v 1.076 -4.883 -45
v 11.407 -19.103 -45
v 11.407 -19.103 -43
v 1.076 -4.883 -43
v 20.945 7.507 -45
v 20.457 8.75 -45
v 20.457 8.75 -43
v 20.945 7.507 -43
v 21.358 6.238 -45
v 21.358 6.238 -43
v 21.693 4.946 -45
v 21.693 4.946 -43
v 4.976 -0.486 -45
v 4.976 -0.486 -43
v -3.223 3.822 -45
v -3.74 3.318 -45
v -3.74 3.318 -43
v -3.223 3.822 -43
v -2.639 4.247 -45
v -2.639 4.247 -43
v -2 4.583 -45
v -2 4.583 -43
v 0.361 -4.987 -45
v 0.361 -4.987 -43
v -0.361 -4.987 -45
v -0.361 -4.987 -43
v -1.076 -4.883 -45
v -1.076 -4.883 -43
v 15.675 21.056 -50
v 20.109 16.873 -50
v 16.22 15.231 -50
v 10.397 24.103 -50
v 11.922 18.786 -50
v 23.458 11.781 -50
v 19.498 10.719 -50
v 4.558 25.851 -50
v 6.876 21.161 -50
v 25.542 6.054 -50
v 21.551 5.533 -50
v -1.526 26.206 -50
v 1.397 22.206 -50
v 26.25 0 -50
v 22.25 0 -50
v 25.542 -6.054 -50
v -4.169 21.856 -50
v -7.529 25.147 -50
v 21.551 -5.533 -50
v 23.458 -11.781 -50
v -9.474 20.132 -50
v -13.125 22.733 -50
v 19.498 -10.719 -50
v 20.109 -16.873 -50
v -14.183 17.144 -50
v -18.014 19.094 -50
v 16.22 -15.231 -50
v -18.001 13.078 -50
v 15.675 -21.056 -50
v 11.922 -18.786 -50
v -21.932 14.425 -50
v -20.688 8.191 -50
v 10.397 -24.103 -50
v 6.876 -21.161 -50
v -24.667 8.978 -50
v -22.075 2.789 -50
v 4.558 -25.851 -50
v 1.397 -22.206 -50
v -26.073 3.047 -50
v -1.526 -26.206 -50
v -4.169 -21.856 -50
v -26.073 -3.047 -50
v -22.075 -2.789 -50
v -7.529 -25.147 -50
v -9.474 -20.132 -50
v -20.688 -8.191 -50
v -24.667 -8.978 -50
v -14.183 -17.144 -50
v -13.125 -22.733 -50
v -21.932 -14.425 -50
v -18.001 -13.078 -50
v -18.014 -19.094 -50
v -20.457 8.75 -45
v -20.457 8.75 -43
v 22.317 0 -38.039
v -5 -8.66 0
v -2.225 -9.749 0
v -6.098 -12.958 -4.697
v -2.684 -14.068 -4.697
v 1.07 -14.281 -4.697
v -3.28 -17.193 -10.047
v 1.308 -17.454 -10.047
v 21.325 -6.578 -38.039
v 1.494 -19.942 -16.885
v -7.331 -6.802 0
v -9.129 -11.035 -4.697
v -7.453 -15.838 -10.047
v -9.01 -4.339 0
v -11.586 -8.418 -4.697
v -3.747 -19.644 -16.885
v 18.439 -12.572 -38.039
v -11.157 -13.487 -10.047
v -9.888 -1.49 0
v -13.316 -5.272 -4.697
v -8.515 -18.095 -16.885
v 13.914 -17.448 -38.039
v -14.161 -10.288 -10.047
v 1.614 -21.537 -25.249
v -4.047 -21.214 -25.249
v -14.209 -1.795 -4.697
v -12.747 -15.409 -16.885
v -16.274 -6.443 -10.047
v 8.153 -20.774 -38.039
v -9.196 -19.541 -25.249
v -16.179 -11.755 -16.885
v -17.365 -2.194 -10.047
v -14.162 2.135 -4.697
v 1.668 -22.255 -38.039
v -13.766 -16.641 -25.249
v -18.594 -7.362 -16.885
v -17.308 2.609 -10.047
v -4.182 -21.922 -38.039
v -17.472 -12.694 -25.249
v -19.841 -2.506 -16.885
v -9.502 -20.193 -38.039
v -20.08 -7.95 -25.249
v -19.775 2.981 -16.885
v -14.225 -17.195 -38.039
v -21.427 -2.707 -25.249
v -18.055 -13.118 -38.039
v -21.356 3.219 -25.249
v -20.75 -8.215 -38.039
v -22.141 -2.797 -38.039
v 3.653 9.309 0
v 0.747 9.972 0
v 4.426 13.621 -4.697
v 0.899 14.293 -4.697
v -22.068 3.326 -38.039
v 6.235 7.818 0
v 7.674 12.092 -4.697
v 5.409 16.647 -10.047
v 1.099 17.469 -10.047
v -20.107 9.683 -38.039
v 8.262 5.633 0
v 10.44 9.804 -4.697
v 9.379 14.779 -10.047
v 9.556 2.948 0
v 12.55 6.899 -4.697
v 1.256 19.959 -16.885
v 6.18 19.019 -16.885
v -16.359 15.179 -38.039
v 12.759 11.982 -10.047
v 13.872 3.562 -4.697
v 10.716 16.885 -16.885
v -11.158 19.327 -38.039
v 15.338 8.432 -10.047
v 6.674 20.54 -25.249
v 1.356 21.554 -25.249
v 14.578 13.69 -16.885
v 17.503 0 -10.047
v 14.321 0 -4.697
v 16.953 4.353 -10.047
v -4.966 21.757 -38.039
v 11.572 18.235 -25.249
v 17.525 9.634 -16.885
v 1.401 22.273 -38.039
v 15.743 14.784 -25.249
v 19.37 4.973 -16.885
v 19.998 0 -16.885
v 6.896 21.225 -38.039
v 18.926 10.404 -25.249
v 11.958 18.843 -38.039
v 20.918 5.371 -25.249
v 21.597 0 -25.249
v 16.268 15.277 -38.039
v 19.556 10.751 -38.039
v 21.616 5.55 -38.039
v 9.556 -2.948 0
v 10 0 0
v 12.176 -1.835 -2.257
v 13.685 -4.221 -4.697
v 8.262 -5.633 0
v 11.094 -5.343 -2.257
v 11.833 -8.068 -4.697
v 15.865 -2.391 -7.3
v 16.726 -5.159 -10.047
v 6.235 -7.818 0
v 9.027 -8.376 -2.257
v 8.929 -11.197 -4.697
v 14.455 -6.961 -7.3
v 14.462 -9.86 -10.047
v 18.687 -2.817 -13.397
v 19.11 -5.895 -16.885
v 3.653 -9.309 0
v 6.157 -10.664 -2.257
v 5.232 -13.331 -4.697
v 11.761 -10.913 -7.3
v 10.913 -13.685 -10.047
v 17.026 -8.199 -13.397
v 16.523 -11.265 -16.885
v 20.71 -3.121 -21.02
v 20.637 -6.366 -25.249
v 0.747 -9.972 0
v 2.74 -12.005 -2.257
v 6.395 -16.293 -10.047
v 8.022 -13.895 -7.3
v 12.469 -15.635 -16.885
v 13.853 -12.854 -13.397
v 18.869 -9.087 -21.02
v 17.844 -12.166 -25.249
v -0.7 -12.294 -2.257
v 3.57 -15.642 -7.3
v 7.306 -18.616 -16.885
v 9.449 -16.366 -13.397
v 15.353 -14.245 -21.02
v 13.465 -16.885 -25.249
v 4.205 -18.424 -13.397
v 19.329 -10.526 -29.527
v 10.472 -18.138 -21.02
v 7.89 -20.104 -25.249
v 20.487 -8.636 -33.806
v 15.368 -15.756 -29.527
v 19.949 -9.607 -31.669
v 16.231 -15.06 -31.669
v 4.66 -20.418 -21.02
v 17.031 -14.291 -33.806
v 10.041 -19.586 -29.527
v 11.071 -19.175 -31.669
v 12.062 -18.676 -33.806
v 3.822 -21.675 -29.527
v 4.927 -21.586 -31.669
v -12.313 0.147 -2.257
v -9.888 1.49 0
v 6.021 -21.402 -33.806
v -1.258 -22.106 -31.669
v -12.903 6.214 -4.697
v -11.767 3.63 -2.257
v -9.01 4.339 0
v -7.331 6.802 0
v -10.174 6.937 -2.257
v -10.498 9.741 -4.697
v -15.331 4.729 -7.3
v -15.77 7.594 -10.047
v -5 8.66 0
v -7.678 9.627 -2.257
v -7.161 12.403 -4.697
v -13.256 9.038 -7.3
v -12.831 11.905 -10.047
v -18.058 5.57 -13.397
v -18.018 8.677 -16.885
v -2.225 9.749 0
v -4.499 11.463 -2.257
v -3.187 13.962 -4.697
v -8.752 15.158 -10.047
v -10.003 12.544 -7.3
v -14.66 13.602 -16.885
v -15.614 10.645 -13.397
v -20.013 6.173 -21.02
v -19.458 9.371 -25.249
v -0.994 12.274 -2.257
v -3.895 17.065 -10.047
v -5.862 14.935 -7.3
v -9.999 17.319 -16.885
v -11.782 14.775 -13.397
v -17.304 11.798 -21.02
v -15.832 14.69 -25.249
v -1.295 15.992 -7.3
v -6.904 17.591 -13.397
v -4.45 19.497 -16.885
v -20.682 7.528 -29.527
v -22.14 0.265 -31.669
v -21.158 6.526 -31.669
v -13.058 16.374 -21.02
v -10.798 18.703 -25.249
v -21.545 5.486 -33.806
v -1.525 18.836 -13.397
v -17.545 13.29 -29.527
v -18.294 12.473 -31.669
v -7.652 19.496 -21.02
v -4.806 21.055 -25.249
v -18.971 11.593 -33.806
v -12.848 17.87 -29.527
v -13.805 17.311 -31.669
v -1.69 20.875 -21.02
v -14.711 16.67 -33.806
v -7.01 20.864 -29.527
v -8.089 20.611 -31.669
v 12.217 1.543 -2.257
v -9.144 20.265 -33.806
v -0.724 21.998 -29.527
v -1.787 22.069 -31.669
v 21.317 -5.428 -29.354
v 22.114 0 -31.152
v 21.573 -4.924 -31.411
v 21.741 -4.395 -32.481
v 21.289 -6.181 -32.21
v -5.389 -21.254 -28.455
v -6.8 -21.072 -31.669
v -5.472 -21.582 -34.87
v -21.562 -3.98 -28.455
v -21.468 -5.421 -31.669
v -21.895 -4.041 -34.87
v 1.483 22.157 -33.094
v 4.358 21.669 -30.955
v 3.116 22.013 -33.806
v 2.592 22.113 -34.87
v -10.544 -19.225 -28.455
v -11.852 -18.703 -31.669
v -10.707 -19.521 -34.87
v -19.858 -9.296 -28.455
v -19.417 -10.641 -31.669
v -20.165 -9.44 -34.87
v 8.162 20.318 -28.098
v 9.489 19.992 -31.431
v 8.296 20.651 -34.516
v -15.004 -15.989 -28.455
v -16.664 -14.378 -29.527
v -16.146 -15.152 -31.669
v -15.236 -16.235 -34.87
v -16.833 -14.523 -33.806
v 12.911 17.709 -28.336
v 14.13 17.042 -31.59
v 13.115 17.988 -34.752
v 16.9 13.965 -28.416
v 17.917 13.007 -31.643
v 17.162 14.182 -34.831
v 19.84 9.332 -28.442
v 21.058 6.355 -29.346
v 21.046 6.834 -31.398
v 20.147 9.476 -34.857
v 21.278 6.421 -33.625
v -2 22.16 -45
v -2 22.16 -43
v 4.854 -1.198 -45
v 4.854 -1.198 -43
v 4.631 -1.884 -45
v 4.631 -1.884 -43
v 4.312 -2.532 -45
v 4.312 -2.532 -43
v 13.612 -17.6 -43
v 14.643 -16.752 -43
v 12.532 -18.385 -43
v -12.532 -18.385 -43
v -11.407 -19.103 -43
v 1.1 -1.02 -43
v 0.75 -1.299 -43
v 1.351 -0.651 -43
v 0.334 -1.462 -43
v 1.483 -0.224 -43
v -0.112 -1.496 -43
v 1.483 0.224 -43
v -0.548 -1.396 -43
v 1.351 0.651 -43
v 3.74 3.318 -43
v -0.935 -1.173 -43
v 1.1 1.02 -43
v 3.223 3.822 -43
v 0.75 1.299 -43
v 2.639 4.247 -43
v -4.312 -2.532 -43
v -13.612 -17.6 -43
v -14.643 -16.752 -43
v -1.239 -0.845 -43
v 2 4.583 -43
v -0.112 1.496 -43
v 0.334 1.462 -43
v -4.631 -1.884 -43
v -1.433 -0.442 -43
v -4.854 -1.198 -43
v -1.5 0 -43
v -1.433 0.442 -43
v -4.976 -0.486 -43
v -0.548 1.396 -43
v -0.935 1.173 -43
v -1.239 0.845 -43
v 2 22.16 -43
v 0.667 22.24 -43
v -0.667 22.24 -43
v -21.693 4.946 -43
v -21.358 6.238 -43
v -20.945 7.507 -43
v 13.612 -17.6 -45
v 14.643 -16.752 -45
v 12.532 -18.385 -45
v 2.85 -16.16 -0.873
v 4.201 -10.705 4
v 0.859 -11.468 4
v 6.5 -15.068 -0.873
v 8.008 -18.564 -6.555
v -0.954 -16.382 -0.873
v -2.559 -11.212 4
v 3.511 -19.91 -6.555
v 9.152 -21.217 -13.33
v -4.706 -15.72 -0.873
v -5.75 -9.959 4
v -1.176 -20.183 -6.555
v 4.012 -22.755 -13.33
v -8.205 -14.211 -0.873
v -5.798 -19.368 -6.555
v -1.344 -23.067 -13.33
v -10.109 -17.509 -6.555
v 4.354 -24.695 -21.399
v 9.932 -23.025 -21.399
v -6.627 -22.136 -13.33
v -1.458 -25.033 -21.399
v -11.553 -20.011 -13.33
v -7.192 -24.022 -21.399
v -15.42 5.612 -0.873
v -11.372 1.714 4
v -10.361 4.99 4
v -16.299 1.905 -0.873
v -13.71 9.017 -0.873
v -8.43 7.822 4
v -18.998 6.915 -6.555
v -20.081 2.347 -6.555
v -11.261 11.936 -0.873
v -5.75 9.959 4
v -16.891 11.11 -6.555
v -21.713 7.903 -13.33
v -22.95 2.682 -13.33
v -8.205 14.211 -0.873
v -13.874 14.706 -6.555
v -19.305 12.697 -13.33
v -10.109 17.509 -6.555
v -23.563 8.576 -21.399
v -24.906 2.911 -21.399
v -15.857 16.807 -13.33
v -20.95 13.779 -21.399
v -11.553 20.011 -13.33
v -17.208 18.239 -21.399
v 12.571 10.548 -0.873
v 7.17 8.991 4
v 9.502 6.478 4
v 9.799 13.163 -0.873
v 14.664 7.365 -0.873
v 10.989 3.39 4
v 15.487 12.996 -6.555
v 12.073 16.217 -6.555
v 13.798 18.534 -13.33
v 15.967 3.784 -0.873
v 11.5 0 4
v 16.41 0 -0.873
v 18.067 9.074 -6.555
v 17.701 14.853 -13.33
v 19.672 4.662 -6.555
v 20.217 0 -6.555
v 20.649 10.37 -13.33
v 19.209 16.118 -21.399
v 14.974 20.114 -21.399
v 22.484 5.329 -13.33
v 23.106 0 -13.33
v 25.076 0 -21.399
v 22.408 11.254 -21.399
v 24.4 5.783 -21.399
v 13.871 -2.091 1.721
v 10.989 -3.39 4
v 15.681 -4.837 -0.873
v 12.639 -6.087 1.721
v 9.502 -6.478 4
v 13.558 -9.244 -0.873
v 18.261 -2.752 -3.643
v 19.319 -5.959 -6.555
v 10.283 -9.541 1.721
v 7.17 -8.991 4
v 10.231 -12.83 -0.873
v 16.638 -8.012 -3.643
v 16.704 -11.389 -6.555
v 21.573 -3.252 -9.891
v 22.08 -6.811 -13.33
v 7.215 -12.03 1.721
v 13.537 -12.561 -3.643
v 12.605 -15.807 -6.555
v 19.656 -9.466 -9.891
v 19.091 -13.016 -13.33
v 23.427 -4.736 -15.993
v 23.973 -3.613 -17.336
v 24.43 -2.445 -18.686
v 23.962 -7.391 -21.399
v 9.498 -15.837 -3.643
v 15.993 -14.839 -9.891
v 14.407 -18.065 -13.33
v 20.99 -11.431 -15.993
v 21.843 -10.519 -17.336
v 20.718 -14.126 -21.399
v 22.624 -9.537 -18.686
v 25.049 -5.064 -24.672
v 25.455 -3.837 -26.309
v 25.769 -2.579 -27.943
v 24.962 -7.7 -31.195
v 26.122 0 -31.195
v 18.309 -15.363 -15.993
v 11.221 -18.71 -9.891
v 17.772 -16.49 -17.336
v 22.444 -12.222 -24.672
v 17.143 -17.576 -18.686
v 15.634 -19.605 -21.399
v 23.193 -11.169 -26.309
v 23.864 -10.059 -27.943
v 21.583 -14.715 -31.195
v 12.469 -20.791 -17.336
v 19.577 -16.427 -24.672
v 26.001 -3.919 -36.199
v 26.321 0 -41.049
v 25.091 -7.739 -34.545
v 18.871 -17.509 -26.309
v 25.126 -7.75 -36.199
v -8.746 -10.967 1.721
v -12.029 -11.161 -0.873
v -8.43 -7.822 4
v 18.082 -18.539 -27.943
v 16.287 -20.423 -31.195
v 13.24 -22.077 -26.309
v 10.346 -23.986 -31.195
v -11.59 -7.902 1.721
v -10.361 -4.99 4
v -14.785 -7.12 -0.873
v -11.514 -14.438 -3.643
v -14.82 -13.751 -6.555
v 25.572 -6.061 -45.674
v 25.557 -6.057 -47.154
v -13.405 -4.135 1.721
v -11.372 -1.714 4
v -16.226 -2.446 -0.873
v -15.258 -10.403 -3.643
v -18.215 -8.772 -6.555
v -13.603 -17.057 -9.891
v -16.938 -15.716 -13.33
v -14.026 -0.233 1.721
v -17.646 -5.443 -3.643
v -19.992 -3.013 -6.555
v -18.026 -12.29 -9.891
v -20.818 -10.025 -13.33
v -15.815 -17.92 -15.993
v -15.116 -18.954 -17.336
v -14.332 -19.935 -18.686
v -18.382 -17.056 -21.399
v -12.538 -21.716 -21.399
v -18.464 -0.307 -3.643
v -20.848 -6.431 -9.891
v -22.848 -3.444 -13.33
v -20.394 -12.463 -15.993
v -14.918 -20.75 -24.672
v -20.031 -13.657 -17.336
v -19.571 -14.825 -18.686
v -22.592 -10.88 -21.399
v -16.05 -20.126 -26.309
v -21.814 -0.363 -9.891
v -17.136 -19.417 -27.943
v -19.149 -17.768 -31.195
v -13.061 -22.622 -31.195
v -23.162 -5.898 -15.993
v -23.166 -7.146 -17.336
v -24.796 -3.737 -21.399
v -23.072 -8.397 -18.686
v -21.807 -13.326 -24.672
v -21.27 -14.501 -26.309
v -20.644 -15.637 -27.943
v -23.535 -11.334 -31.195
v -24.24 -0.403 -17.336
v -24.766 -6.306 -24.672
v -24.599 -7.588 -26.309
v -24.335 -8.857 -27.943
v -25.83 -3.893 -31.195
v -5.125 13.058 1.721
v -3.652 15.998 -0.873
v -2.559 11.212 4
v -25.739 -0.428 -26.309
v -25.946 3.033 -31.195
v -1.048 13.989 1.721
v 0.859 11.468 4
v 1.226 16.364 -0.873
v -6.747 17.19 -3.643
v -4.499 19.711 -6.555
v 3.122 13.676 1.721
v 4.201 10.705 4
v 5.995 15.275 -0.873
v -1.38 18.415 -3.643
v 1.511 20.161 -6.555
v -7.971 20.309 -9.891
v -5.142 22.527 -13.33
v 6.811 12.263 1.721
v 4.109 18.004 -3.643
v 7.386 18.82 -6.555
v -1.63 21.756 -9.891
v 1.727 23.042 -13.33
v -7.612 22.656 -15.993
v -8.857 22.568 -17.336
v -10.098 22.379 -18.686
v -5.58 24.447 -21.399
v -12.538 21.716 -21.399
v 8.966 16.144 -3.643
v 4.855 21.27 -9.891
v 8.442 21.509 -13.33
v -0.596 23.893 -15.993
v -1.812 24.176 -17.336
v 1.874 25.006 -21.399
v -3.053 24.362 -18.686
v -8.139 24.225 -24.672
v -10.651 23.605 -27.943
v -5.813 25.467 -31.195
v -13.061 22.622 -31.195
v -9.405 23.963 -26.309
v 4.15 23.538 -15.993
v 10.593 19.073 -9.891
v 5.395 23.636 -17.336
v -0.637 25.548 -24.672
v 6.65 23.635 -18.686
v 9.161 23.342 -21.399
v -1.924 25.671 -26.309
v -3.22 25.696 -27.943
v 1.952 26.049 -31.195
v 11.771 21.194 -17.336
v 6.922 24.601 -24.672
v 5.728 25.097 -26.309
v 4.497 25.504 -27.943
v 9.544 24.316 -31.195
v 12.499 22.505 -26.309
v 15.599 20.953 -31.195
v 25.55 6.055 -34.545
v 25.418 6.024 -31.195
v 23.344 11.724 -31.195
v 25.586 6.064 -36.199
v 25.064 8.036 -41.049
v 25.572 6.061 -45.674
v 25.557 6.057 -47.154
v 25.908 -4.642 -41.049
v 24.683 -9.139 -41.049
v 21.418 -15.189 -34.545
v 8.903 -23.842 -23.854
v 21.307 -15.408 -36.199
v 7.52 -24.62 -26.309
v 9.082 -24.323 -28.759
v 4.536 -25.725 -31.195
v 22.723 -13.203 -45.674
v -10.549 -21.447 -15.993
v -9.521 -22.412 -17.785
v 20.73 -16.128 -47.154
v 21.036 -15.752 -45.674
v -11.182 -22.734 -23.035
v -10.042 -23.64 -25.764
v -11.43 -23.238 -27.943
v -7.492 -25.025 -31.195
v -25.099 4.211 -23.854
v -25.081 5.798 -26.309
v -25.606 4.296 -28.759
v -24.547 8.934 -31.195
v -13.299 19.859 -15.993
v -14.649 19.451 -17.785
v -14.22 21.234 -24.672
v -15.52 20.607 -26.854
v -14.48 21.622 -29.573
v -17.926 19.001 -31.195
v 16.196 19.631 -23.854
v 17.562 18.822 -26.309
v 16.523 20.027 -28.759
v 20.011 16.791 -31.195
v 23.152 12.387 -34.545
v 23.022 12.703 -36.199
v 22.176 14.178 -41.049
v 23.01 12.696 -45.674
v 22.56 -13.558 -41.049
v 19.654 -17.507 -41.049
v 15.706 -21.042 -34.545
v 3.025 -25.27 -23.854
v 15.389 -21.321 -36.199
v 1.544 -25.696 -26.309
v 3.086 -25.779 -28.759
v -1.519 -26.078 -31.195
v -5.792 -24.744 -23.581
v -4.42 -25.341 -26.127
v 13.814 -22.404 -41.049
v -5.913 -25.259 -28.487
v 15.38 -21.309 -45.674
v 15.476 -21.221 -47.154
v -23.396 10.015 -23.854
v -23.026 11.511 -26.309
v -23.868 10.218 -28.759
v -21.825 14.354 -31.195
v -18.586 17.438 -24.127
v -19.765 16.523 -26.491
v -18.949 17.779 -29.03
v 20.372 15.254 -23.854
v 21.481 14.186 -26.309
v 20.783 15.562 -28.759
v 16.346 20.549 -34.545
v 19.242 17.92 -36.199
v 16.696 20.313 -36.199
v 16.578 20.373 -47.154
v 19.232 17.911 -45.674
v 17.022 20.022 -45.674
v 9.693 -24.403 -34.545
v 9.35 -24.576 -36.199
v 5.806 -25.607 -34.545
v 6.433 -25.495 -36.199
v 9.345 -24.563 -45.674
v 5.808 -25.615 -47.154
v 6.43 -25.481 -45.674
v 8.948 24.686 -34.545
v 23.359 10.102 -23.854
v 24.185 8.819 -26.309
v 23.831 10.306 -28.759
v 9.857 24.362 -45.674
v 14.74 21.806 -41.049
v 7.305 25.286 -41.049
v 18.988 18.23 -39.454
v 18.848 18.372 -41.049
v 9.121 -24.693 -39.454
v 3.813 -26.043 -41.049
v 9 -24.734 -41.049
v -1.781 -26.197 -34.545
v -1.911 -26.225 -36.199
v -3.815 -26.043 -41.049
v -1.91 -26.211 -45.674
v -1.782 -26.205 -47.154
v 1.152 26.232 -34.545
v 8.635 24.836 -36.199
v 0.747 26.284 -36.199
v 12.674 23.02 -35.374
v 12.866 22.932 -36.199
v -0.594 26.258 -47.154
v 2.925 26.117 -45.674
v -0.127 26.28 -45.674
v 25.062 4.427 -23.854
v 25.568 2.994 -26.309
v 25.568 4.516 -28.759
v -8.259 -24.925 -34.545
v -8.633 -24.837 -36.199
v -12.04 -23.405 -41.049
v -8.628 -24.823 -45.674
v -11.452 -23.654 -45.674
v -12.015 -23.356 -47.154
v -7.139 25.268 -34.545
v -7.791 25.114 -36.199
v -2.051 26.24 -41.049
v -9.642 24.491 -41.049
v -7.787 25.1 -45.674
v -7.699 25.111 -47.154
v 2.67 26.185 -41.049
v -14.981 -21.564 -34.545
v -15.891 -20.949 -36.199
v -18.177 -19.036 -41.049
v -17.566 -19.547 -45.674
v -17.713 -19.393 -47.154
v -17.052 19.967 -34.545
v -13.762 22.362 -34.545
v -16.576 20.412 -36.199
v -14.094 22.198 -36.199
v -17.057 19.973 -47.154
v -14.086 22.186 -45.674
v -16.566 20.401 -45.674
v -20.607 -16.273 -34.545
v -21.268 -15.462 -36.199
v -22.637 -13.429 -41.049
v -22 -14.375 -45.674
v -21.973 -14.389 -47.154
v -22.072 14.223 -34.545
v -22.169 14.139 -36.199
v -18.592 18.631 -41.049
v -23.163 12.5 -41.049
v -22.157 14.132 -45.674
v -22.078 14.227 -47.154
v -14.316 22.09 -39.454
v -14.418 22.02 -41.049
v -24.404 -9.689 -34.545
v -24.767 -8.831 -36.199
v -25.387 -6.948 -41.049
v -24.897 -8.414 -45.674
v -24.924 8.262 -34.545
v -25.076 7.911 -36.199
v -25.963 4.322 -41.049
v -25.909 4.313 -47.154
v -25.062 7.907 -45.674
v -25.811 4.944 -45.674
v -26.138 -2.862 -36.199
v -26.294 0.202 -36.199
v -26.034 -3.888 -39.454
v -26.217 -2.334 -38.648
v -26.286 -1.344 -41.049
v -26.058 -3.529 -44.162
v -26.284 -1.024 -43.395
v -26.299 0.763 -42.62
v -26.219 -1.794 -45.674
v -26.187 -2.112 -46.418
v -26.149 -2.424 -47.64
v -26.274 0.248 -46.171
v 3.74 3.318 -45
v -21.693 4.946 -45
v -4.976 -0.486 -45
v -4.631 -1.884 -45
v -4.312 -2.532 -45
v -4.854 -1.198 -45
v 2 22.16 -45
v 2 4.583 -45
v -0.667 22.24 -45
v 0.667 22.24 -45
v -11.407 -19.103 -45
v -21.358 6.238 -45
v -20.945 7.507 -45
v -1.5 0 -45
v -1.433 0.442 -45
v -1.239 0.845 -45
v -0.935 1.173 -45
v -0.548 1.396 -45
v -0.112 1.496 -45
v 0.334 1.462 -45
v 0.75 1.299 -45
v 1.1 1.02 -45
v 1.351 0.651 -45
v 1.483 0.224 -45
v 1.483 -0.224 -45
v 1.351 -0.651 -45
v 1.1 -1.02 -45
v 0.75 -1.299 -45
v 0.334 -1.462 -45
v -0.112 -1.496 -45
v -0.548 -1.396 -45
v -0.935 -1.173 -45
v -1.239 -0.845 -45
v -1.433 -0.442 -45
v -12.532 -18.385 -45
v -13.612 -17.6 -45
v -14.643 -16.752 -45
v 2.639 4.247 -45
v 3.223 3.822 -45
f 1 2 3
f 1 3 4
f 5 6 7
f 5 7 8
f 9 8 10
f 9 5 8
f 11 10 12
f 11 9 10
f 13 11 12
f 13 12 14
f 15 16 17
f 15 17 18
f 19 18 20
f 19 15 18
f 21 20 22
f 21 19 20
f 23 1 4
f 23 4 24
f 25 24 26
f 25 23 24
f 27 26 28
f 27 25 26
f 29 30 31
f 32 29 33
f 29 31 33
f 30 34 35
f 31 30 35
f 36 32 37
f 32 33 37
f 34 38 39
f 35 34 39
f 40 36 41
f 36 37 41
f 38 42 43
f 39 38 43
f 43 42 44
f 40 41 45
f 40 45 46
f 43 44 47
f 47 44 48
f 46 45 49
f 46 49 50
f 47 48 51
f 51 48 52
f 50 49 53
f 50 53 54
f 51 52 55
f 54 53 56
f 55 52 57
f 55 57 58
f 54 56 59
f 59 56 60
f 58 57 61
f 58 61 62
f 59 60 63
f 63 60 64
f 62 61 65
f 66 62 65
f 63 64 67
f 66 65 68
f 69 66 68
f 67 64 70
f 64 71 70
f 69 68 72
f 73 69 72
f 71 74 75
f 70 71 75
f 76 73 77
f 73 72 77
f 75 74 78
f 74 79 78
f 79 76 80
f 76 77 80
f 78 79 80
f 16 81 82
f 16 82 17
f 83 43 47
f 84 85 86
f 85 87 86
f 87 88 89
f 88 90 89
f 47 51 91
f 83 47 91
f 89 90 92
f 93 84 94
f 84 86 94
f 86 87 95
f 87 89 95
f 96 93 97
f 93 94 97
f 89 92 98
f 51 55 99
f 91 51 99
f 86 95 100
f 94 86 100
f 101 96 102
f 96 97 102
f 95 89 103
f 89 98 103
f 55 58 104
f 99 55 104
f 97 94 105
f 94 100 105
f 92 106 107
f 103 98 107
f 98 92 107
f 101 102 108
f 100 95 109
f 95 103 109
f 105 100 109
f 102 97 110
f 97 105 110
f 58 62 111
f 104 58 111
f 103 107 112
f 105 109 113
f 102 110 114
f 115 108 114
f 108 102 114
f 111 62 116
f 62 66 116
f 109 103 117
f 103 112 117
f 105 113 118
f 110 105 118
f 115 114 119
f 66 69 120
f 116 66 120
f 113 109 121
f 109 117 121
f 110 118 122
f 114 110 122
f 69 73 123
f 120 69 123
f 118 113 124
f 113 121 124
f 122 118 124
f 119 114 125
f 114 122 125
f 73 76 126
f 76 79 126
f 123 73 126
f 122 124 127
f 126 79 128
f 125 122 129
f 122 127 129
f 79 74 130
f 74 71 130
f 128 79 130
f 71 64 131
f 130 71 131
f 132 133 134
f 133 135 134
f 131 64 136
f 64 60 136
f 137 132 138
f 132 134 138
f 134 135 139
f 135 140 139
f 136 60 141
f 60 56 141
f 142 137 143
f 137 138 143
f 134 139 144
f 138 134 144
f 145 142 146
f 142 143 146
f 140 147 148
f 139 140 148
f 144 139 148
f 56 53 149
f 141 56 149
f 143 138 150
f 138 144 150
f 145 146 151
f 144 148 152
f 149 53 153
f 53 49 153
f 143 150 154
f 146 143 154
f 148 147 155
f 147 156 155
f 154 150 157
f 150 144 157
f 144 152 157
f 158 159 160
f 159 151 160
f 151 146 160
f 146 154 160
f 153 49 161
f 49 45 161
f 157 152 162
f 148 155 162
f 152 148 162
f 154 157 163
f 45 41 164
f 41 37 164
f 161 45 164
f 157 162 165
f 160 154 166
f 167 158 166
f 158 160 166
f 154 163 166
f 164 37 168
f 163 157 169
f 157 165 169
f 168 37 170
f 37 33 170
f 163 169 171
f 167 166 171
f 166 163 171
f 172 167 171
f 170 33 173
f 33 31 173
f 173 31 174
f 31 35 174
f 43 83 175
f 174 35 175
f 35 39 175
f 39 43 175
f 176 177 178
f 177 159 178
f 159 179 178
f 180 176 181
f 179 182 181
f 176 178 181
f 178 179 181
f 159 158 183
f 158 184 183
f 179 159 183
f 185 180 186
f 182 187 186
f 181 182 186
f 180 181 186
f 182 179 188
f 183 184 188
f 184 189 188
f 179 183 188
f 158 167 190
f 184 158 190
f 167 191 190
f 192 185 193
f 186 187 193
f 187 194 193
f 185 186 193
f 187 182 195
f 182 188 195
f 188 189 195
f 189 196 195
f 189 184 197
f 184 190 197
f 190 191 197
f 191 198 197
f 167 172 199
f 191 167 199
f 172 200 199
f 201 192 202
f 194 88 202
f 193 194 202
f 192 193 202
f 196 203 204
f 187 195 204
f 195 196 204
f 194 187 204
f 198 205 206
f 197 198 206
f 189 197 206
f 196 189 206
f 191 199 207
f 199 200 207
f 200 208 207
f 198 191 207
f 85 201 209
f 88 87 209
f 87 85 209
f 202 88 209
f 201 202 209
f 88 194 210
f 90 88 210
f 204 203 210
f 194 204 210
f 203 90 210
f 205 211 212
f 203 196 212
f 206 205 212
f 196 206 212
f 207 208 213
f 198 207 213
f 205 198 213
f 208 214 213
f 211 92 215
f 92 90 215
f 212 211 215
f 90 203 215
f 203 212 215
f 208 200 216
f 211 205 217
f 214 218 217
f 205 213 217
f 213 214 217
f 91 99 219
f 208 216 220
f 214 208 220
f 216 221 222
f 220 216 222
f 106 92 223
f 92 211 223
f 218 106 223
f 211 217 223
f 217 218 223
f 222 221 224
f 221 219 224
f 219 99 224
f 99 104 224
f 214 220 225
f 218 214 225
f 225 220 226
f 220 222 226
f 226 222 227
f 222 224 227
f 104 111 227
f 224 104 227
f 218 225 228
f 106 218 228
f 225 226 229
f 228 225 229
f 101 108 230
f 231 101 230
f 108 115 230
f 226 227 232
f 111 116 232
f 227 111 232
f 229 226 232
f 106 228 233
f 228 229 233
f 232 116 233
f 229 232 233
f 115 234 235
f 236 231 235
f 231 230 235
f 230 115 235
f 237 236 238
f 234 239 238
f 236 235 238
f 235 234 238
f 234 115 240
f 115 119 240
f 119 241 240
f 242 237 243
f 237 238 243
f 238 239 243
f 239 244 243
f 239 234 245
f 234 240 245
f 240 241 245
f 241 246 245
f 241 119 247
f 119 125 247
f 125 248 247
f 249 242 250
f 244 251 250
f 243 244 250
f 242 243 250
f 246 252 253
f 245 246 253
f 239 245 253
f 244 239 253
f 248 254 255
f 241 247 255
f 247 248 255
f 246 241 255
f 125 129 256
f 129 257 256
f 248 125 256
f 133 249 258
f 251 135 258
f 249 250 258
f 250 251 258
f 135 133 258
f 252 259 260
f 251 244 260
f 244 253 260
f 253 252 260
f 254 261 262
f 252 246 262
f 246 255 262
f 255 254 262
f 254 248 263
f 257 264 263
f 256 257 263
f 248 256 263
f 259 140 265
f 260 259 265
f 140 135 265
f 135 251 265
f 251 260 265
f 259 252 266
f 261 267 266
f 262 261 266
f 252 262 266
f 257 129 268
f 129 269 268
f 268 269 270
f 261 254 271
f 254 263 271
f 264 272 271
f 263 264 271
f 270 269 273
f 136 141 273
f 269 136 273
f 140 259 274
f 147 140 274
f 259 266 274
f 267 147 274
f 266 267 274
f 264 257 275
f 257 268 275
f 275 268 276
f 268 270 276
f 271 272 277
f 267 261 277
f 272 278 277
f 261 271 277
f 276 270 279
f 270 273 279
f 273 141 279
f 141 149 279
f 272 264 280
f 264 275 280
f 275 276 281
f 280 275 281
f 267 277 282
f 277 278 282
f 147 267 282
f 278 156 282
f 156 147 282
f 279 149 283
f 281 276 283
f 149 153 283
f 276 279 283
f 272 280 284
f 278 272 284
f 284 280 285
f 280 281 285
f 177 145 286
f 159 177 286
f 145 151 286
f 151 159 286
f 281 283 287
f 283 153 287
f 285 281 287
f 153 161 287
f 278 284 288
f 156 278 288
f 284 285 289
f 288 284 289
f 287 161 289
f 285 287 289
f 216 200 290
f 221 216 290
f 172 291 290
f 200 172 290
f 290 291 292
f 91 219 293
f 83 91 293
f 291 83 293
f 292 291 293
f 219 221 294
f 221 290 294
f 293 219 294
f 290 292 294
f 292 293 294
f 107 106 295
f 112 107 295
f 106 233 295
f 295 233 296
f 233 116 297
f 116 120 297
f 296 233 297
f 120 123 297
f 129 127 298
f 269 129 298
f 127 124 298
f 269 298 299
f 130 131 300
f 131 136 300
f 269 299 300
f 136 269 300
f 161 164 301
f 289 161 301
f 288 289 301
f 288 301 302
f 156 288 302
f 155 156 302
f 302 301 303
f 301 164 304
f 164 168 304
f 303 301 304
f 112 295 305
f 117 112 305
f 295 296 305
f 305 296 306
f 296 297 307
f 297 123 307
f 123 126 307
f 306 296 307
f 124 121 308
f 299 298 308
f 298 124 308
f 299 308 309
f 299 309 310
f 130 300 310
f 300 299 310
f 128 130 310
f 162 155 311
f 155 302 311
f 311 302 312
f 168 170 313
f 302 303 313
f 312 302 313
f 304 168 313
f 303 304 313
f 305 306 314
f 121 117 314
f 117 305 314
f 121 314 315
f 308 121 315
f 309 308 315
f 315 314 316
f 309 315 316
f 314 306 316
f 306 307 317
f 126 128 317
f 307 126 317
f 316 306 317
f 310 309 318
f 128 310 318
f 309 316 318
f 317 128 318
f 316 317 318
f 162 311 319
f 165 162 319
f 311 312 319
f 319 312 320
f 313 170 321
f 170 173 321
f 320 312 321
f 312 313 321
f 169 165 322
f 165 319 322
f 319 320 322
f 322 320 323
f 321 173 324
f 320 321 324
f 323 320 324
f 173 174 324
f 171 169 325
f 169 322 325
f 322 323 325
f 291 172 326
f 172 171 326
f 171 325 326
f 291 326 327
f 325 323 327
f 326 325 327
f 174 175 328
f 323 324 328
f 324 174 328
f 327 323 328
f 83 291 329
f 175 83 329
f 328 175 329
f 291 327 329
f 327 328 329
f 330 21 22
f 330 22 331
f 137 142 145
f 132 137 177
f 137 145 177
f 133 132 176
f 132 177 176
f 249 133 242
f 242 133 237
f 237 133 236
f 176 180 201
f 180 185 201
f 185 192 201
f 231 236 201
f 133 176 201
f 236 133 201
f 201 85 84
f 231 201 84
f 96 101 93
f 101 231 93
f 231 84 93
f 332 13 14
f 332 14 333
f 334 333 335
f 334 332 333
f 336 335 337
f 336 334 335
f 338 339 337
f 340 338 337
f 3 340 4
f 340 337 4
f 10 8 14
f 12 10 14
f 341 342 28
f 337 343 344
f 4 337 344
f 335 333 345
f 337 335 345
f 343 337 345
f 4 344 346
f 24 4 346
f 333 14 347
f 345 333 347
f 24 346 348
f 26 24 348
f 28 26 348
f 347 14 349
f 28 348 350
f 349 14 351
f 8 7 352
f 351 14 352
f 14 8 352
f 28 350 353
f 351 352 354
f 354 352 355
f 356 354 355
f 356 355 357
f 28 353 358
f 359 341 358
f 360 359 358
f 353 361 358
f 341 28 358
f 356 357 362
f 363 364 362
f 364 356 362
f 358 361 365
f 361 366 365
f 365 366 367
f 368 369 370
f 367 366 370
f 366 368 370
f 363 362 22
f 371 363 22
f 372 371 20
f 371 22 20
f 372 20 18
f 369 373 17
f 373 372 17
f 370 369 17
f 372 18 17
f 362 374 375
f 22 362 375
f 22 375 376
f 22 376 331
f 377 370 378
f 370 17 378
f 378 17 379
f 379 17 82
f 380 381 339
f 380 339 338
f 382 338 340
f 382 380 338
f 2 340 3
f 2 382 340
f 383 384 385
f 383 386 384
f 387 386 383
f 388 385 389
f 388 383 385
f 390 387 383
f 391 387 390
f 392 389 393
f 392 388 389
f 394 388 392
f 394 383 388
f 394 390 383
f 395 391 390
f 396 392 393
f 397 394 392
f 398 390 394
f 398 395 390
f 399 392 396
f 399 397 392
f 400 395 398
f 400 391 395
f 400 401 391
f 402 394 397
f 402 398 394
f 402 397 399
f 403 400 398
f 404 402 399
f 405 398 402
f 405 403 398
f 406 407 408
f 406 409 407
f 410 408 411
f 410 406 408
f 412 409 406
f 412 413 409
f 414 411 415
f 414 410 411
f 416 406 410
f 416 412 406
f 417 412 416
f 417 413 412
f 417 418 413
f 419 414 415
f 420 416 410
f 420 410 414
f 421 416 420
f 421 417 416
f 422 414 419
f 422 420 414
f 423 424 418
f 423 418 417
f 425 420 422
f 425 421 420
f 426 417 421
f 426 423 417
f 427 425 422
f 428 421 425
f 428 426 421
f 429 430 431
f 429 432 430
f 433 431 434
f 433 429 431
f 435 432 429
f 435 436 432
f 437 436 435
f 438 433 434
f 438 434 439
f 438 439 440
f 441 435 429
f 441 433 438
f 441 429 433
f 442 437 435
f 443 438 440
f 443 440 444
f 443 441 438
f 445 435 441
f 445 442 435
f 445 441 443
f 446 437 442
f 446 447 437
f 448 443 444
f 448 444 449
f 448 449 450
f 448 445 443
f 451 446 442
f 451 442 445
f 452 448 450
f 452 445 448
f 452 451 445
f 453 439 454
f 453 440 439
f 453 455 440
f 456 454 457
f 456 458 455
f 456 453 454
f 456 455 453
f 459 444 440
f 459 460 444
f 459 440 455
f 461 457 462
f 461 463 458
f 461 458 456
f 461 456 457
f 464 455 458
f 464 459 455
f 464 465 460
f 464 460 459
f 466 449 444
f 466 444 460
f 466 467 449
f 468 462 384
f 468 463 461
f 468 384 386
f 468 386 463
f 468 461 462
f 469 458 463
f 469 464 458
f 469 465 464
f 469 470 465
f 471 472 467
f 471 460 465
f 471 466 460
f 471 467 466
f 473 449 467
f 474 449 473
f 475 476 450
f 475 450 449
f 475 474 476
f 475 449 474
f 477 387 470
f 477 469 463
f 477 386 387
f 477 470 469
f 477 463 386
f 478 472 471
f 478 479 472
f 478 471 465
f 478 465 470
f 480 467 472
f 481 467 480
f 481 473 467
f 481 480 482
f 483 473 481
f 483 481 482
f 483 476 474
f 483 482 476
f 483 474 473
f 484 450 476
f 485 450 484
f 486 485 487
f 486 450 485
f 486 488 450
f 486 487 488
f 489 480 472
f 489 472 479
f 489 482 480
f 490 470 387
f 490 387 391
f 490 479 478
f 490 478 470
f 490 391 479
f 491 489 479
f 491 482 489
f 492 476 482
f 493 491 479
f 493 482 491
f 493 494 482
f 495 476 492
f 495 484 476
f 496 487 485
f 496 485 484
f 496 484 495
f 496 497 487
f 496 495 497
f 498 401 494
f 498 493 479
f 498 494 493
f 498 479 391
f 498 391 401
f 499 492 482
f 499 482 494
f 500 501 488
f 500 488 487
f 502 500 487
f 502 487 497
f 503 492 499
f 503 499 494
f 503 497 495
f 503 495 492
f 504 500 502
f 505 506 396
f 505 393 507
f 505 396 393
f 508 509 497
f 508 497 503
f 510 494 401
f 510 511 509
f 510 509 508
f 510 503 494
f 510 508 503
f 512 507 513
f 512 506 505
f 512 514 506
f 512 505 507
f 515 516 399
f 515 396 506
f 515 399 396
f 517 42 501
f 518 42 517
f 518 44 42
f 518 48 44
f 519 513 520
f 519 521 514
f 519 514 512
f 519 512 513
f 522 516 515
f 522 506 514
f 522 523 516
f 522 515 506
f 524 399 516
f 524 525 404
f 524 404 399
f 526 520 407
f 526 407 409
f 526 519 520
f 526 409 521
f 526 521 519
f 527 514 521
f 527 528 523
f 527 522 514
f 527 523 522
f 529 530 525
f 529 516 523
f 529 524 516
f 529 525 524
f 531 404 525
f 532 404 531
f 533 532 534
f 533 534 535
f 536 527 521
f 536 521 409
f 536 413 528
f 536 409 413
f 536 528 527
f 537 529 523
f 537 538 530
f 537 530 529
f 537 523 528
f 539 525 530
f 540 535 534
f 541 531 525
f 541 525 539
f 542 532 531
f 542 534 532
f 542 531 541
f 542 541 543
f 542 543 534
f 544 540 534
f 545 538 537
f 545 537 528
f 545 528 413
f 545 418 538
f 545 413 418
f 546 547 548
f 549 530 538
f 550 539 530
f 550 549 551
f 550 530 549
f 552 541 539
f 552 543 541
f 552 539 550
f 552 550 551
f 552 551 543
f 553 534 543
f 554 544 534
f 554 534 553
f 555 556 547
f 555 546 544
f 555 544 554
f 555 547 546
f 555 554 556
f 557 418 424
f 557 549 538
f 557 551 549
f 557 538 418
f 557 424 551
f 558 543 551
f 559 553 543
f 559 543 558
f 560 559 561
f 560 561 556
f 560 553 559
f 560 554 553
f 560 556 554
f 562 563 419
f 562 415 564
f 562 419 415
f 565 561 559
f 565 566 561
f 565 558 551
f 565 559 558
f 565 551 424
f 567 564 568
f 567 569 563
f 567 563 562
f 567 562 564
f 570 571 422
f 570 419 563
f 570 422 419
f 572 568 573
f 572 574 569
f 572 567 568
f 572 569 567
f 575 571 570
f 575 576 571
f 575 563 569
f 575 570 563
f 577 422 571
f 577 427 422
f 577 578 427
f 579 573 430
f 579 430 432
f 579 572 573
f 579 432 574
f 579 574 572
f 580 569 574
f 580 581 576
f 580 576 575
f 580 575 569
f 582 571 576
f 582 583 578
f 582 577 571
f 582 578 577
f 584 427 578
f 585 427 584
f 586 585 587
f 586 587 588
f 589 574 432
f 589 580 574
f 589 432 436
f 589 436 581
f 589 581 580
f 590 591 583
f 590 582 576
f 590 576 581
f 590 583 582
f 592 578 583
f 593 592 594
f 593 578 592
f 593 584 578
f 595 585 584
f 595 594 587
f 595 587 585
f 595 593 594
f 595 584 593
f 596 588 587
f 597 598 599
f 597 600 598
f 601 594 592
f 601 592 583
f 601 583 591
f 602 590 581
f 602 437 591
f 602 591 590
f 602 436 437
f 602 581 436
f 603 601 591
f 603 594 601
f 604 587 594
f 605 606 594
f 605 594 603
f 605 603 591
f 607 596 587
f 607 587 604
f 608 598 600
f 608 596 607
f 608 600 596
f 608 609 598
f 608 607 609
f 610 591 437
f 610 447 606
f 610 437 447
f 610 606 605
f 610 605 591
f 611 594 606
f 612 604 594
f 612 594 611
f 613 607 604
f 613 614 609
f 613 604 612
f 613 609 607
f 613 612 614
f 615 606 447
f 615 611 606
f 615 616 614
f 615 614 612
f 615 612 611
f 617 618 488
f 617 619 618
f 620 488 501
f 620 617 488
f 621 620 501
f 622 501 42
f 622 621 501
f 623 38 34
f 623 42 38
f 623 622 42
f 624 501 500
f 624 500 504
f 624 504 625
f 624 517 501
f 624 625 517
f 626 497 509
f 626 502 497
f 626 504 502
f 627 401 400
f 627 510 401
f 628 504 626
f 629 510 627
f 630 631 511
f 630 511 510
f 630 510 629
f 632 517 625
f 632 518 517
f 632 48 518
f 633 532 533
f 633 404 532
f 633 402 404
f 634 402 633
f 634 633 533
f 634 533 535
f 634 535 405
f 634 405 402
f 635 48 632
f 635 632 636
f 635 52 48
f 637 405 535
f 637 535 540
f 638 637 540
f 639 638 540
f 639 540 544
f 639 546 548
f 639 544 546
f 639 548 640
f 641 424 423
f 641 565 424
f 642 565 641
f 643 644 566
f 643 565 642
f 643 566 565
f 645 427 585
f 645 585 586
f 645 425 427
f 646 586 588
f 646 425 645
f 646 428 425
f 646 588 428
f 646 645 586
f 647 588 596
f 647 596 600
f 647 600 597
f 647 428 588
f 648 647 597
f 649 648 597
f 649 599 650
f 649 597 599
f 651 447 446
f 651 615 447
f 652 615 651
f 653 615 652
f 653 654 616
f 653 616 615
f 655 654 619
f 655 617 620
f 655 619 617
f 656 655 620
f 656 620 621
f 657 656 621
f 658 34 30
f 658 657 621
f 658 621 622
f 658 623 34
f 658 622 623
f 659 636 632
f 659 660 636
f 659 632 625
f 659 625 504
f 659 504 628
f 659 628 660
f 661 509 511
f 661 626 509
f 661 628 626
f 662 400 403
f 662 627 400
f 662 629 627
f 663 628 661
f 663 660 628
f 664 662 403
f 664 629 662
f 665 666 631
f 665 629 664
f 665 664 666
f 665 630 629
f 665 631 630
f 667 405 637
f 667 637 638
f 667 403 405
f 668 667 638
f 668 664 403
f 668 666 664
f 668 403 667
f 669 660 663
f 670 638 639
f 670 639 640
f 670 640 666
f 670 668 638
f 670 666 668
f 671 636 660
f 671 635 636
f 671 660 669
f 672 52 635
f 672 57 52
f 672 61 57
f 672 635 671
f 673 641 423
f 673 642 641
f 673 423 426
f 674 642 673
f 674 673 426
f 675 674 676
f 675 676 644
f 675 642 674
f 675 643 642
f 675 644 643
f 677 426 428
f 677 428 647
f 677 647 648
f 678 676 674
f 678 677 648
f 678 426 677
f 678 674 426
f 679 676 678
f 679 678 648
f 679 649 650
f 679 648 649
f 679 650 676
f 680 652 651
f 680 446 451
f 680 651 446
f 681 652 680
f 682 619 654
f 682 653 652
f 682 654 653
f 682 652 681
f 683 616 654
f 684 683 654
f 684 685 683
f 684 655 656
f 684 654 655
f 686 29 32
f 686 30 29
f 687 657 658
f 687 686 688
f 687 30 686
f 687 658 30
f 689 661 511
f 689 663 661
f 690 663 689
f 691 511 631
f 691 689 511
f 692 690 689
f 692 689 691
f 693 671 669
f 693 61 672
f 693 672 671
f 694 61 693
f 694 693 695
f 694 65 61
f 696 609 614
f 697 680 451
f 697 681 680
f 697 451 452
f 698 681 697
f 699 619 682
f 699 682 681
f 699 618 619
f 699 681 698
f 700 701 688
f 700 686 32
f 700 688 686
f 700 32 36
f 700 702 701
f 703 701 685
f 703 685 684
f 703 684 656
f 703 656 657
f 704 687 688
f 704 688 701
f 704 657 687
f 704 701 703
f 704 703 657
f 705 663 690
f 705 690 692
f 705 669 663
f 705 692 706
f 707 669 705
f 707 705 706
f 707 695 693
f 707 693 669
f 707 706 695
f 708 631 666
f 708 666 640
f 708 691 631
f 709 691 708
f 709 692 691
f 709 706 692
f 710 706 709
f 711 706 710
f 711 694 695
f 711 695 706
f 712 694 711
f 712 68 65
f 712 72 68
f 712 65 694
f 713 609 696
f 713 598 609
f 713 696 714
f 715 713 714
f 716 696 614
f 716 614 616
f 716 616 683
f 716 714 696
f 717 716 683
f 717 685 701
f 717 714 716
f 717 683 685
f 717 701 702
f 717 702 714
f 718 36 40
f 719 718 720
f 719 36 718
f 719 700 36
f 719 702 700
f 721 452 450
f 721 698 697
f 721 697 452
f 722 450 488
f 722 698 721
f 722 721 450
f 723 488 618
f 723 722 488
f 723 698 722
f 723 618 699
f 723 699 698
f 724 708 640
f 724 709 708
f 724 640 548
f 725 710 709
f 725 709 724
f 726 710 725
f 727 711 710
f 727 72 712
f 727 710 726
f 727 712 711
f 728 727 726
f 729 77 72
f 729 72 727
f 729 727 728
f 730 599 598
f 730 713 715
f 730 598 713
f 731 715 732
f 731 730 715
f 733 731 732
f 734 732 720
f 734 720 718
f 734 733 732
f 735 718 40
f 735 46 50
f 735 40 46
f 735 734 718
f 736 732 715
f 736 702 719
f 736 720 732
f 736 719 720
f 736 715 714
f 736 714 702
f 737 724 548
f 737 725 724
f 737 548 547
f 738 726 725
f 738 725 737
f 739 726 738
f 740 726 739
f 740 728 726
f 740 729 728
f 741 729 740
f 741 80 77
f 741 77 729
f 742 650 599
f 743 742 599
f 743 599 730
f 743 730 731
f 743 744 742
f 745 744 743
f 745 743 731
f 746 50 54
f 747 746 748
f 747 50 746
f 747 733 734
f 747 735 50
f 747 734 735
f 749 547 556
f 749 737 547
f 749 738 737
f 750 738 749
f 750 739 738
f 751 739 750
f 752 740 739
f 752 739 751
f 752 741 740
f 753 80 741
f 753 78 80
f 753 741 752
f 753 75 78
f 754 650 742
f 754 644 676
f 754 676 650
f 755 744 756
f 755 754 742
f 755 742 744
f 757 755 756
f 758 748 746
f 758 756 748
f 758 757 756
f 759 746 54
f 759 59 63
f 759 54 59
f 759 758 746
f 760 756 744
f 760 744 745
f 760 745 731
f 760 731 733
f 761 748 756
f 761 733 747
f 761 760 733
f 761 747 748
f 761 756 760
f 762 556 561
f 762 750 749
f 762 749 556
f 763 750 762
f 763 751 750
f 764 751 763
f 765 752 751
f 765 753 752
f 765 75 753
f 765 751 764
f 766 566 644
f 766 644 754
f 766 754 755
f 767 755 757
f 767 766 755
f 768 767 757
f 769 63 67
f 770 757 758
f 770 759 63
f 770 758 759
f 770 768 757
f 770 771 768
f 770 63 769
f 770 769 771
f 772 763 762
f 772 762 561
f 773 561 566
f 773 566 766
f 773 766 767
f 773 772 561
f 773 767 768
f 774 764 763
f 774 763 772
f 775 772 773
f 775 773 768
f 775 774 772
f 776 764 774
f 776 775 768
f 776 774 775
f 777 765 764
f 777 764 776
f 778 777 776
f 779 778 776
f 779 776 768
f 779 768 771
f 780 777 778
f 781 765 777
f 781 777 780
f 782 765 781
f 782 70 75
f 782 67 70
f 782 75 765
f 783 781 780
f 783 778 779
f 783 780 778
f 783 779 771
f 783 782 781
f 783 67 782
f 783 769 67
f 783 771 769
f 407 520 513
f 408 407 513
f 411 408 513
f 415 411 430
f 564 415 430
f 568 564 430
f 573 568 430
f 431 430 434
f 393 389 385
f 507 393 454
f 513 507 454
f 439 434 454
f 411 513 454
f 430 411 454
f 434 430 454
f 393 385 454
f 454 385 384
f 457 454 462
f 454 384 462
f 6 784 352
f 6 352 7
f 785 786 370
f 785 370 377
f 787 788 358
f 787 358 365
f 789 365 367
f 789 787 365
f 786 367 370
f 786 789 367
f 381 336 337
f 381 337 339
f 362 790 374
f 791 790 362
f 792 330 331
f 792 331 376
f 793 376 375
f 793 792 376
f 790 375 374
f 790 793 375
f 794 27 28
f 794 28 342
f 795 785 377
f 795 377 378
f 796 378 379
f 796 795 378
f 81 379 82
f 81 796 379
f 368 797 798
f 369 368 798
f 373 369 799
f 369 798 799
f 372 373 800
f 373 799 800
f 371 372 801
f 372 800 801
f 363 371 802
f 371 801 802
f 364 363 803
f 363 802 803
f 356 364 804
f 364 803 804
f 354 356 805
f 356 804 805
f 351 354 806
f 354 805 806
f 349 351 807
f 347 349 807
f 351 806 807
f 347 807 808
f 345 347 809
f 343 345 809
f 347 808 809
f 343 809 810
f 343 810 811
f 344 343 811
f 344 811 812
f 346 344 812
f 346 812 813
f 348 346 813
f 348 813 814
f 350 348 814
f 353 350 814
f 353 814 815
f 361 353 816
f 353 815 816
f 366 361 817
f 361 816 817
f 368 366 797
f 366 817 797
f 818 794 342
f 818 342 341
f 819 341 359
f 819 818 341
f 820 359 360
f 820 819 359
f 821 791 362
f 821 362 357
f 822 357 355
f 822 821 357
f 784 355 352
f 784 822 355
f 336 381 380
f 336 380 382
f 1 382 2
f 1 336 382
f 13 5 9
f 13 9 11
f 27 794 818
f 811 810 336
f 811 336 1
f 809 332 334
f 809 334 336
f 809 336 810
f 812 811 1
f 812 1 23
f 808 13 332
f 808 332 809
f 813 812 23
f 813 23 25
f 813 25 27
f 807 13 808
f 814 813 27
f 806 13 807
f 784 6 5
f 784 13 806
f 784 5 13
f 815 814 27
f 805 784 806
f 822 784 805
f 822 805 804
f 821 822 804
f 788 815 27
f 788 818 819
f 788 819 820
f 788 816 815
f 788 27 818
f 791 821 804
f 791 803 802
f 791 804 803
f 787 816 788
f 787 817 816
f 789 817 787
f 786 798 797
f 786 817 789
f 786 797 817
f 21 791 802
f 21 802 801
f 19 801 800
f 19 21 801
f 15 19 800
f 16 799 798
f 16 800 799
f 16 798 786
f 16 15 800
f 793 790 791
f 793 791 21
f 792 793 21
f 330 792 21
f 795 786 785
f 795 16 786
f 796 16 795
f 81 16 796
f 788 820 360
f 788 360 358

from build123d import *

# Parameters (mm, degrees)
BOSS_EXTRUDE1_START = -5
SKETCH2_R           = 5
SKETCH2_R_2         = 1.5
BOSS_EXTRUDE1_DEPTH = 2


with BuildPart() as part:
    # Sketch1 → shell (revolve)
    with BuildSketch(Plane(origin=(0, 0, 0), x_dir=(1, 0, 0), z_dir=(0, 1, 0))):
        with BuildLine():
            Line((11.5, -4), (0, -4))
            Line((0, -4), (0, 0))
            Line((0, 0), (10, 0))
            add(Edge.make_bspline(
                [(10, 0), (24.034381635, 12.248187609), (22.25, 34.257055754), (22.25, 50)],
                knots=[0, 0, 0, 0, 1, 1, 1, 1], degree=3))
            Line((22.25, 50), (26.25, 50))
            add(Edge.make_bspline(
                [(11.5, -4), (11.725173343, -3.803485082), (12.067418801, -3.504749737), (12.505804305, -3.122287819), (13.003995722, -2.686986315), (13.631035477, -2.110599487), (14.586618128, -1.177906899), (15.718513744, 0.032272543), (17.388046624, 2.04442819), (19.221282106, 4.692166419), (21.648969692, 9.149559888), (23.823527306, 15.033546425), (25.361055027, 22.339489226), (26.116247645, 29.693496956), (26.311712181, 35.706717236), (26.329483565, 40.350371596), (26.302675507, 43.724921754), (26.27083444, 46.419765101), (26.253607546, 48.500738482), (26.25, 49.496517954), (26.25, 50)],
                knots=[-0.026842104, -0.026842104, -0.026842104, -0.026842104, -0.010797696, -0.002775492, 0.005246712, 0.02129112, 0.037335528, 0.069424343, 0.101513159, 0.165690791, 0.229868422, 0.358223685, 0.486578948, 0.614934211, 0.743289474, 0.807467106, 0.871644737, 0.935822369, 0.967911184, 1, 1, 1, 1], degree=3))
        make_face()
    revolve(axis=Axis((0, 0, 0), (0, 0, -1)))


with BuildPart() as body_2:
    # Sketch2 → Boss-Extrude1 (new body)
    with BuildSketch(Plane(origin=(0, 0, -50), x_dir=(-1, 0, 0), z_dir=(0, 0, -1)).offset(BOSS_EXTRUDE1_START)):
        with BuildLine():
            Line((14.643314066, -16.752189503), (4.3116044, -2.531811111))
            ThreePointArc((4.3116044, -2.531811111), (2.938926261, -4.045084972), (1.075536422, -4.88295212))
            Line((1.075536422, -4.88295212), (11.407246089, -19.103330512))
            ThreePointArc((11.407246089, -19.103330512), (13.078221864, -18.000628125), (14.643314066, -16.752189503))
        make_face()
        Circle(SKETCH2_R)
        Circle(SKETCH2_R_2, mode=Mode.SUBTRACT)
        with BuildLine():
            ThreePointArc((-1.075536422, -4.88295212), (-2.938926261, -4.045084972), (-4.3116044, -2.531811111))
            Line((-4.3116044, -2.531811111), (-14.643314066, -16.752189503))
            ThreePointArc((-14.643314066, -16.752189503), (-13.078221864, -18.000628125), (-11.407246089, -19.103330512))
            Line((-11.407246089, -19.103330512), (-1.075536422, -4.88295212))
        make_face()
        with BuildLine():
            ThreePointArc((-4.976322465, -0.486019265), (-4.755282581, 1.545084972), (-3.740254487, 3.3182068))
            Line((-3.740254487, 3.3182068), (-20.45731189, 8.749908013))
            ThreePointArc((-20.45731189, 8.749908013), (-21.161007488, 6.875628125), (-21.693379867, 4.945681948))
            Line((-21.693379867, 4.945681948), (-4.976322465, -0.486019265))
        make_face()
        with BuildLine():
            ThreePointArc((-2, 4.582575695), (0, 5), (2, 4.582575695))
            Line((2, 4.582575695), (2, 22.159930054))
            ThreePointArc((2, 22.159930054), (0, 22.25), (-2, 22.159930054))
            Line((-2, 22.159930054), (-2, 4.582575695))
        make_face()
        with BuildLine():
            Line((20.45731189, 8.749908013), (3.740254487, 3.3182068))
            ThreePointArc((3.740254487, 3.3182068), (4.67446641, 1.774644692), (5, 0))
            ThreePointArc((5, 0), (4.994077108, -0.243297838), (4.976322465, -0.486019265))
            Line((4.976322465, -0.486019265), (21.693379867, 4.945681948))
            ThreePointArc((21.693379867, 4.945681948), (21.161007488, 6.875628125), (20.45731189, 8.749908013))
        make_face()
    extrude(amount=-BOSS_EXTRUDE1_DEPTH)


solid = Compound([part.part, body_2.part])
